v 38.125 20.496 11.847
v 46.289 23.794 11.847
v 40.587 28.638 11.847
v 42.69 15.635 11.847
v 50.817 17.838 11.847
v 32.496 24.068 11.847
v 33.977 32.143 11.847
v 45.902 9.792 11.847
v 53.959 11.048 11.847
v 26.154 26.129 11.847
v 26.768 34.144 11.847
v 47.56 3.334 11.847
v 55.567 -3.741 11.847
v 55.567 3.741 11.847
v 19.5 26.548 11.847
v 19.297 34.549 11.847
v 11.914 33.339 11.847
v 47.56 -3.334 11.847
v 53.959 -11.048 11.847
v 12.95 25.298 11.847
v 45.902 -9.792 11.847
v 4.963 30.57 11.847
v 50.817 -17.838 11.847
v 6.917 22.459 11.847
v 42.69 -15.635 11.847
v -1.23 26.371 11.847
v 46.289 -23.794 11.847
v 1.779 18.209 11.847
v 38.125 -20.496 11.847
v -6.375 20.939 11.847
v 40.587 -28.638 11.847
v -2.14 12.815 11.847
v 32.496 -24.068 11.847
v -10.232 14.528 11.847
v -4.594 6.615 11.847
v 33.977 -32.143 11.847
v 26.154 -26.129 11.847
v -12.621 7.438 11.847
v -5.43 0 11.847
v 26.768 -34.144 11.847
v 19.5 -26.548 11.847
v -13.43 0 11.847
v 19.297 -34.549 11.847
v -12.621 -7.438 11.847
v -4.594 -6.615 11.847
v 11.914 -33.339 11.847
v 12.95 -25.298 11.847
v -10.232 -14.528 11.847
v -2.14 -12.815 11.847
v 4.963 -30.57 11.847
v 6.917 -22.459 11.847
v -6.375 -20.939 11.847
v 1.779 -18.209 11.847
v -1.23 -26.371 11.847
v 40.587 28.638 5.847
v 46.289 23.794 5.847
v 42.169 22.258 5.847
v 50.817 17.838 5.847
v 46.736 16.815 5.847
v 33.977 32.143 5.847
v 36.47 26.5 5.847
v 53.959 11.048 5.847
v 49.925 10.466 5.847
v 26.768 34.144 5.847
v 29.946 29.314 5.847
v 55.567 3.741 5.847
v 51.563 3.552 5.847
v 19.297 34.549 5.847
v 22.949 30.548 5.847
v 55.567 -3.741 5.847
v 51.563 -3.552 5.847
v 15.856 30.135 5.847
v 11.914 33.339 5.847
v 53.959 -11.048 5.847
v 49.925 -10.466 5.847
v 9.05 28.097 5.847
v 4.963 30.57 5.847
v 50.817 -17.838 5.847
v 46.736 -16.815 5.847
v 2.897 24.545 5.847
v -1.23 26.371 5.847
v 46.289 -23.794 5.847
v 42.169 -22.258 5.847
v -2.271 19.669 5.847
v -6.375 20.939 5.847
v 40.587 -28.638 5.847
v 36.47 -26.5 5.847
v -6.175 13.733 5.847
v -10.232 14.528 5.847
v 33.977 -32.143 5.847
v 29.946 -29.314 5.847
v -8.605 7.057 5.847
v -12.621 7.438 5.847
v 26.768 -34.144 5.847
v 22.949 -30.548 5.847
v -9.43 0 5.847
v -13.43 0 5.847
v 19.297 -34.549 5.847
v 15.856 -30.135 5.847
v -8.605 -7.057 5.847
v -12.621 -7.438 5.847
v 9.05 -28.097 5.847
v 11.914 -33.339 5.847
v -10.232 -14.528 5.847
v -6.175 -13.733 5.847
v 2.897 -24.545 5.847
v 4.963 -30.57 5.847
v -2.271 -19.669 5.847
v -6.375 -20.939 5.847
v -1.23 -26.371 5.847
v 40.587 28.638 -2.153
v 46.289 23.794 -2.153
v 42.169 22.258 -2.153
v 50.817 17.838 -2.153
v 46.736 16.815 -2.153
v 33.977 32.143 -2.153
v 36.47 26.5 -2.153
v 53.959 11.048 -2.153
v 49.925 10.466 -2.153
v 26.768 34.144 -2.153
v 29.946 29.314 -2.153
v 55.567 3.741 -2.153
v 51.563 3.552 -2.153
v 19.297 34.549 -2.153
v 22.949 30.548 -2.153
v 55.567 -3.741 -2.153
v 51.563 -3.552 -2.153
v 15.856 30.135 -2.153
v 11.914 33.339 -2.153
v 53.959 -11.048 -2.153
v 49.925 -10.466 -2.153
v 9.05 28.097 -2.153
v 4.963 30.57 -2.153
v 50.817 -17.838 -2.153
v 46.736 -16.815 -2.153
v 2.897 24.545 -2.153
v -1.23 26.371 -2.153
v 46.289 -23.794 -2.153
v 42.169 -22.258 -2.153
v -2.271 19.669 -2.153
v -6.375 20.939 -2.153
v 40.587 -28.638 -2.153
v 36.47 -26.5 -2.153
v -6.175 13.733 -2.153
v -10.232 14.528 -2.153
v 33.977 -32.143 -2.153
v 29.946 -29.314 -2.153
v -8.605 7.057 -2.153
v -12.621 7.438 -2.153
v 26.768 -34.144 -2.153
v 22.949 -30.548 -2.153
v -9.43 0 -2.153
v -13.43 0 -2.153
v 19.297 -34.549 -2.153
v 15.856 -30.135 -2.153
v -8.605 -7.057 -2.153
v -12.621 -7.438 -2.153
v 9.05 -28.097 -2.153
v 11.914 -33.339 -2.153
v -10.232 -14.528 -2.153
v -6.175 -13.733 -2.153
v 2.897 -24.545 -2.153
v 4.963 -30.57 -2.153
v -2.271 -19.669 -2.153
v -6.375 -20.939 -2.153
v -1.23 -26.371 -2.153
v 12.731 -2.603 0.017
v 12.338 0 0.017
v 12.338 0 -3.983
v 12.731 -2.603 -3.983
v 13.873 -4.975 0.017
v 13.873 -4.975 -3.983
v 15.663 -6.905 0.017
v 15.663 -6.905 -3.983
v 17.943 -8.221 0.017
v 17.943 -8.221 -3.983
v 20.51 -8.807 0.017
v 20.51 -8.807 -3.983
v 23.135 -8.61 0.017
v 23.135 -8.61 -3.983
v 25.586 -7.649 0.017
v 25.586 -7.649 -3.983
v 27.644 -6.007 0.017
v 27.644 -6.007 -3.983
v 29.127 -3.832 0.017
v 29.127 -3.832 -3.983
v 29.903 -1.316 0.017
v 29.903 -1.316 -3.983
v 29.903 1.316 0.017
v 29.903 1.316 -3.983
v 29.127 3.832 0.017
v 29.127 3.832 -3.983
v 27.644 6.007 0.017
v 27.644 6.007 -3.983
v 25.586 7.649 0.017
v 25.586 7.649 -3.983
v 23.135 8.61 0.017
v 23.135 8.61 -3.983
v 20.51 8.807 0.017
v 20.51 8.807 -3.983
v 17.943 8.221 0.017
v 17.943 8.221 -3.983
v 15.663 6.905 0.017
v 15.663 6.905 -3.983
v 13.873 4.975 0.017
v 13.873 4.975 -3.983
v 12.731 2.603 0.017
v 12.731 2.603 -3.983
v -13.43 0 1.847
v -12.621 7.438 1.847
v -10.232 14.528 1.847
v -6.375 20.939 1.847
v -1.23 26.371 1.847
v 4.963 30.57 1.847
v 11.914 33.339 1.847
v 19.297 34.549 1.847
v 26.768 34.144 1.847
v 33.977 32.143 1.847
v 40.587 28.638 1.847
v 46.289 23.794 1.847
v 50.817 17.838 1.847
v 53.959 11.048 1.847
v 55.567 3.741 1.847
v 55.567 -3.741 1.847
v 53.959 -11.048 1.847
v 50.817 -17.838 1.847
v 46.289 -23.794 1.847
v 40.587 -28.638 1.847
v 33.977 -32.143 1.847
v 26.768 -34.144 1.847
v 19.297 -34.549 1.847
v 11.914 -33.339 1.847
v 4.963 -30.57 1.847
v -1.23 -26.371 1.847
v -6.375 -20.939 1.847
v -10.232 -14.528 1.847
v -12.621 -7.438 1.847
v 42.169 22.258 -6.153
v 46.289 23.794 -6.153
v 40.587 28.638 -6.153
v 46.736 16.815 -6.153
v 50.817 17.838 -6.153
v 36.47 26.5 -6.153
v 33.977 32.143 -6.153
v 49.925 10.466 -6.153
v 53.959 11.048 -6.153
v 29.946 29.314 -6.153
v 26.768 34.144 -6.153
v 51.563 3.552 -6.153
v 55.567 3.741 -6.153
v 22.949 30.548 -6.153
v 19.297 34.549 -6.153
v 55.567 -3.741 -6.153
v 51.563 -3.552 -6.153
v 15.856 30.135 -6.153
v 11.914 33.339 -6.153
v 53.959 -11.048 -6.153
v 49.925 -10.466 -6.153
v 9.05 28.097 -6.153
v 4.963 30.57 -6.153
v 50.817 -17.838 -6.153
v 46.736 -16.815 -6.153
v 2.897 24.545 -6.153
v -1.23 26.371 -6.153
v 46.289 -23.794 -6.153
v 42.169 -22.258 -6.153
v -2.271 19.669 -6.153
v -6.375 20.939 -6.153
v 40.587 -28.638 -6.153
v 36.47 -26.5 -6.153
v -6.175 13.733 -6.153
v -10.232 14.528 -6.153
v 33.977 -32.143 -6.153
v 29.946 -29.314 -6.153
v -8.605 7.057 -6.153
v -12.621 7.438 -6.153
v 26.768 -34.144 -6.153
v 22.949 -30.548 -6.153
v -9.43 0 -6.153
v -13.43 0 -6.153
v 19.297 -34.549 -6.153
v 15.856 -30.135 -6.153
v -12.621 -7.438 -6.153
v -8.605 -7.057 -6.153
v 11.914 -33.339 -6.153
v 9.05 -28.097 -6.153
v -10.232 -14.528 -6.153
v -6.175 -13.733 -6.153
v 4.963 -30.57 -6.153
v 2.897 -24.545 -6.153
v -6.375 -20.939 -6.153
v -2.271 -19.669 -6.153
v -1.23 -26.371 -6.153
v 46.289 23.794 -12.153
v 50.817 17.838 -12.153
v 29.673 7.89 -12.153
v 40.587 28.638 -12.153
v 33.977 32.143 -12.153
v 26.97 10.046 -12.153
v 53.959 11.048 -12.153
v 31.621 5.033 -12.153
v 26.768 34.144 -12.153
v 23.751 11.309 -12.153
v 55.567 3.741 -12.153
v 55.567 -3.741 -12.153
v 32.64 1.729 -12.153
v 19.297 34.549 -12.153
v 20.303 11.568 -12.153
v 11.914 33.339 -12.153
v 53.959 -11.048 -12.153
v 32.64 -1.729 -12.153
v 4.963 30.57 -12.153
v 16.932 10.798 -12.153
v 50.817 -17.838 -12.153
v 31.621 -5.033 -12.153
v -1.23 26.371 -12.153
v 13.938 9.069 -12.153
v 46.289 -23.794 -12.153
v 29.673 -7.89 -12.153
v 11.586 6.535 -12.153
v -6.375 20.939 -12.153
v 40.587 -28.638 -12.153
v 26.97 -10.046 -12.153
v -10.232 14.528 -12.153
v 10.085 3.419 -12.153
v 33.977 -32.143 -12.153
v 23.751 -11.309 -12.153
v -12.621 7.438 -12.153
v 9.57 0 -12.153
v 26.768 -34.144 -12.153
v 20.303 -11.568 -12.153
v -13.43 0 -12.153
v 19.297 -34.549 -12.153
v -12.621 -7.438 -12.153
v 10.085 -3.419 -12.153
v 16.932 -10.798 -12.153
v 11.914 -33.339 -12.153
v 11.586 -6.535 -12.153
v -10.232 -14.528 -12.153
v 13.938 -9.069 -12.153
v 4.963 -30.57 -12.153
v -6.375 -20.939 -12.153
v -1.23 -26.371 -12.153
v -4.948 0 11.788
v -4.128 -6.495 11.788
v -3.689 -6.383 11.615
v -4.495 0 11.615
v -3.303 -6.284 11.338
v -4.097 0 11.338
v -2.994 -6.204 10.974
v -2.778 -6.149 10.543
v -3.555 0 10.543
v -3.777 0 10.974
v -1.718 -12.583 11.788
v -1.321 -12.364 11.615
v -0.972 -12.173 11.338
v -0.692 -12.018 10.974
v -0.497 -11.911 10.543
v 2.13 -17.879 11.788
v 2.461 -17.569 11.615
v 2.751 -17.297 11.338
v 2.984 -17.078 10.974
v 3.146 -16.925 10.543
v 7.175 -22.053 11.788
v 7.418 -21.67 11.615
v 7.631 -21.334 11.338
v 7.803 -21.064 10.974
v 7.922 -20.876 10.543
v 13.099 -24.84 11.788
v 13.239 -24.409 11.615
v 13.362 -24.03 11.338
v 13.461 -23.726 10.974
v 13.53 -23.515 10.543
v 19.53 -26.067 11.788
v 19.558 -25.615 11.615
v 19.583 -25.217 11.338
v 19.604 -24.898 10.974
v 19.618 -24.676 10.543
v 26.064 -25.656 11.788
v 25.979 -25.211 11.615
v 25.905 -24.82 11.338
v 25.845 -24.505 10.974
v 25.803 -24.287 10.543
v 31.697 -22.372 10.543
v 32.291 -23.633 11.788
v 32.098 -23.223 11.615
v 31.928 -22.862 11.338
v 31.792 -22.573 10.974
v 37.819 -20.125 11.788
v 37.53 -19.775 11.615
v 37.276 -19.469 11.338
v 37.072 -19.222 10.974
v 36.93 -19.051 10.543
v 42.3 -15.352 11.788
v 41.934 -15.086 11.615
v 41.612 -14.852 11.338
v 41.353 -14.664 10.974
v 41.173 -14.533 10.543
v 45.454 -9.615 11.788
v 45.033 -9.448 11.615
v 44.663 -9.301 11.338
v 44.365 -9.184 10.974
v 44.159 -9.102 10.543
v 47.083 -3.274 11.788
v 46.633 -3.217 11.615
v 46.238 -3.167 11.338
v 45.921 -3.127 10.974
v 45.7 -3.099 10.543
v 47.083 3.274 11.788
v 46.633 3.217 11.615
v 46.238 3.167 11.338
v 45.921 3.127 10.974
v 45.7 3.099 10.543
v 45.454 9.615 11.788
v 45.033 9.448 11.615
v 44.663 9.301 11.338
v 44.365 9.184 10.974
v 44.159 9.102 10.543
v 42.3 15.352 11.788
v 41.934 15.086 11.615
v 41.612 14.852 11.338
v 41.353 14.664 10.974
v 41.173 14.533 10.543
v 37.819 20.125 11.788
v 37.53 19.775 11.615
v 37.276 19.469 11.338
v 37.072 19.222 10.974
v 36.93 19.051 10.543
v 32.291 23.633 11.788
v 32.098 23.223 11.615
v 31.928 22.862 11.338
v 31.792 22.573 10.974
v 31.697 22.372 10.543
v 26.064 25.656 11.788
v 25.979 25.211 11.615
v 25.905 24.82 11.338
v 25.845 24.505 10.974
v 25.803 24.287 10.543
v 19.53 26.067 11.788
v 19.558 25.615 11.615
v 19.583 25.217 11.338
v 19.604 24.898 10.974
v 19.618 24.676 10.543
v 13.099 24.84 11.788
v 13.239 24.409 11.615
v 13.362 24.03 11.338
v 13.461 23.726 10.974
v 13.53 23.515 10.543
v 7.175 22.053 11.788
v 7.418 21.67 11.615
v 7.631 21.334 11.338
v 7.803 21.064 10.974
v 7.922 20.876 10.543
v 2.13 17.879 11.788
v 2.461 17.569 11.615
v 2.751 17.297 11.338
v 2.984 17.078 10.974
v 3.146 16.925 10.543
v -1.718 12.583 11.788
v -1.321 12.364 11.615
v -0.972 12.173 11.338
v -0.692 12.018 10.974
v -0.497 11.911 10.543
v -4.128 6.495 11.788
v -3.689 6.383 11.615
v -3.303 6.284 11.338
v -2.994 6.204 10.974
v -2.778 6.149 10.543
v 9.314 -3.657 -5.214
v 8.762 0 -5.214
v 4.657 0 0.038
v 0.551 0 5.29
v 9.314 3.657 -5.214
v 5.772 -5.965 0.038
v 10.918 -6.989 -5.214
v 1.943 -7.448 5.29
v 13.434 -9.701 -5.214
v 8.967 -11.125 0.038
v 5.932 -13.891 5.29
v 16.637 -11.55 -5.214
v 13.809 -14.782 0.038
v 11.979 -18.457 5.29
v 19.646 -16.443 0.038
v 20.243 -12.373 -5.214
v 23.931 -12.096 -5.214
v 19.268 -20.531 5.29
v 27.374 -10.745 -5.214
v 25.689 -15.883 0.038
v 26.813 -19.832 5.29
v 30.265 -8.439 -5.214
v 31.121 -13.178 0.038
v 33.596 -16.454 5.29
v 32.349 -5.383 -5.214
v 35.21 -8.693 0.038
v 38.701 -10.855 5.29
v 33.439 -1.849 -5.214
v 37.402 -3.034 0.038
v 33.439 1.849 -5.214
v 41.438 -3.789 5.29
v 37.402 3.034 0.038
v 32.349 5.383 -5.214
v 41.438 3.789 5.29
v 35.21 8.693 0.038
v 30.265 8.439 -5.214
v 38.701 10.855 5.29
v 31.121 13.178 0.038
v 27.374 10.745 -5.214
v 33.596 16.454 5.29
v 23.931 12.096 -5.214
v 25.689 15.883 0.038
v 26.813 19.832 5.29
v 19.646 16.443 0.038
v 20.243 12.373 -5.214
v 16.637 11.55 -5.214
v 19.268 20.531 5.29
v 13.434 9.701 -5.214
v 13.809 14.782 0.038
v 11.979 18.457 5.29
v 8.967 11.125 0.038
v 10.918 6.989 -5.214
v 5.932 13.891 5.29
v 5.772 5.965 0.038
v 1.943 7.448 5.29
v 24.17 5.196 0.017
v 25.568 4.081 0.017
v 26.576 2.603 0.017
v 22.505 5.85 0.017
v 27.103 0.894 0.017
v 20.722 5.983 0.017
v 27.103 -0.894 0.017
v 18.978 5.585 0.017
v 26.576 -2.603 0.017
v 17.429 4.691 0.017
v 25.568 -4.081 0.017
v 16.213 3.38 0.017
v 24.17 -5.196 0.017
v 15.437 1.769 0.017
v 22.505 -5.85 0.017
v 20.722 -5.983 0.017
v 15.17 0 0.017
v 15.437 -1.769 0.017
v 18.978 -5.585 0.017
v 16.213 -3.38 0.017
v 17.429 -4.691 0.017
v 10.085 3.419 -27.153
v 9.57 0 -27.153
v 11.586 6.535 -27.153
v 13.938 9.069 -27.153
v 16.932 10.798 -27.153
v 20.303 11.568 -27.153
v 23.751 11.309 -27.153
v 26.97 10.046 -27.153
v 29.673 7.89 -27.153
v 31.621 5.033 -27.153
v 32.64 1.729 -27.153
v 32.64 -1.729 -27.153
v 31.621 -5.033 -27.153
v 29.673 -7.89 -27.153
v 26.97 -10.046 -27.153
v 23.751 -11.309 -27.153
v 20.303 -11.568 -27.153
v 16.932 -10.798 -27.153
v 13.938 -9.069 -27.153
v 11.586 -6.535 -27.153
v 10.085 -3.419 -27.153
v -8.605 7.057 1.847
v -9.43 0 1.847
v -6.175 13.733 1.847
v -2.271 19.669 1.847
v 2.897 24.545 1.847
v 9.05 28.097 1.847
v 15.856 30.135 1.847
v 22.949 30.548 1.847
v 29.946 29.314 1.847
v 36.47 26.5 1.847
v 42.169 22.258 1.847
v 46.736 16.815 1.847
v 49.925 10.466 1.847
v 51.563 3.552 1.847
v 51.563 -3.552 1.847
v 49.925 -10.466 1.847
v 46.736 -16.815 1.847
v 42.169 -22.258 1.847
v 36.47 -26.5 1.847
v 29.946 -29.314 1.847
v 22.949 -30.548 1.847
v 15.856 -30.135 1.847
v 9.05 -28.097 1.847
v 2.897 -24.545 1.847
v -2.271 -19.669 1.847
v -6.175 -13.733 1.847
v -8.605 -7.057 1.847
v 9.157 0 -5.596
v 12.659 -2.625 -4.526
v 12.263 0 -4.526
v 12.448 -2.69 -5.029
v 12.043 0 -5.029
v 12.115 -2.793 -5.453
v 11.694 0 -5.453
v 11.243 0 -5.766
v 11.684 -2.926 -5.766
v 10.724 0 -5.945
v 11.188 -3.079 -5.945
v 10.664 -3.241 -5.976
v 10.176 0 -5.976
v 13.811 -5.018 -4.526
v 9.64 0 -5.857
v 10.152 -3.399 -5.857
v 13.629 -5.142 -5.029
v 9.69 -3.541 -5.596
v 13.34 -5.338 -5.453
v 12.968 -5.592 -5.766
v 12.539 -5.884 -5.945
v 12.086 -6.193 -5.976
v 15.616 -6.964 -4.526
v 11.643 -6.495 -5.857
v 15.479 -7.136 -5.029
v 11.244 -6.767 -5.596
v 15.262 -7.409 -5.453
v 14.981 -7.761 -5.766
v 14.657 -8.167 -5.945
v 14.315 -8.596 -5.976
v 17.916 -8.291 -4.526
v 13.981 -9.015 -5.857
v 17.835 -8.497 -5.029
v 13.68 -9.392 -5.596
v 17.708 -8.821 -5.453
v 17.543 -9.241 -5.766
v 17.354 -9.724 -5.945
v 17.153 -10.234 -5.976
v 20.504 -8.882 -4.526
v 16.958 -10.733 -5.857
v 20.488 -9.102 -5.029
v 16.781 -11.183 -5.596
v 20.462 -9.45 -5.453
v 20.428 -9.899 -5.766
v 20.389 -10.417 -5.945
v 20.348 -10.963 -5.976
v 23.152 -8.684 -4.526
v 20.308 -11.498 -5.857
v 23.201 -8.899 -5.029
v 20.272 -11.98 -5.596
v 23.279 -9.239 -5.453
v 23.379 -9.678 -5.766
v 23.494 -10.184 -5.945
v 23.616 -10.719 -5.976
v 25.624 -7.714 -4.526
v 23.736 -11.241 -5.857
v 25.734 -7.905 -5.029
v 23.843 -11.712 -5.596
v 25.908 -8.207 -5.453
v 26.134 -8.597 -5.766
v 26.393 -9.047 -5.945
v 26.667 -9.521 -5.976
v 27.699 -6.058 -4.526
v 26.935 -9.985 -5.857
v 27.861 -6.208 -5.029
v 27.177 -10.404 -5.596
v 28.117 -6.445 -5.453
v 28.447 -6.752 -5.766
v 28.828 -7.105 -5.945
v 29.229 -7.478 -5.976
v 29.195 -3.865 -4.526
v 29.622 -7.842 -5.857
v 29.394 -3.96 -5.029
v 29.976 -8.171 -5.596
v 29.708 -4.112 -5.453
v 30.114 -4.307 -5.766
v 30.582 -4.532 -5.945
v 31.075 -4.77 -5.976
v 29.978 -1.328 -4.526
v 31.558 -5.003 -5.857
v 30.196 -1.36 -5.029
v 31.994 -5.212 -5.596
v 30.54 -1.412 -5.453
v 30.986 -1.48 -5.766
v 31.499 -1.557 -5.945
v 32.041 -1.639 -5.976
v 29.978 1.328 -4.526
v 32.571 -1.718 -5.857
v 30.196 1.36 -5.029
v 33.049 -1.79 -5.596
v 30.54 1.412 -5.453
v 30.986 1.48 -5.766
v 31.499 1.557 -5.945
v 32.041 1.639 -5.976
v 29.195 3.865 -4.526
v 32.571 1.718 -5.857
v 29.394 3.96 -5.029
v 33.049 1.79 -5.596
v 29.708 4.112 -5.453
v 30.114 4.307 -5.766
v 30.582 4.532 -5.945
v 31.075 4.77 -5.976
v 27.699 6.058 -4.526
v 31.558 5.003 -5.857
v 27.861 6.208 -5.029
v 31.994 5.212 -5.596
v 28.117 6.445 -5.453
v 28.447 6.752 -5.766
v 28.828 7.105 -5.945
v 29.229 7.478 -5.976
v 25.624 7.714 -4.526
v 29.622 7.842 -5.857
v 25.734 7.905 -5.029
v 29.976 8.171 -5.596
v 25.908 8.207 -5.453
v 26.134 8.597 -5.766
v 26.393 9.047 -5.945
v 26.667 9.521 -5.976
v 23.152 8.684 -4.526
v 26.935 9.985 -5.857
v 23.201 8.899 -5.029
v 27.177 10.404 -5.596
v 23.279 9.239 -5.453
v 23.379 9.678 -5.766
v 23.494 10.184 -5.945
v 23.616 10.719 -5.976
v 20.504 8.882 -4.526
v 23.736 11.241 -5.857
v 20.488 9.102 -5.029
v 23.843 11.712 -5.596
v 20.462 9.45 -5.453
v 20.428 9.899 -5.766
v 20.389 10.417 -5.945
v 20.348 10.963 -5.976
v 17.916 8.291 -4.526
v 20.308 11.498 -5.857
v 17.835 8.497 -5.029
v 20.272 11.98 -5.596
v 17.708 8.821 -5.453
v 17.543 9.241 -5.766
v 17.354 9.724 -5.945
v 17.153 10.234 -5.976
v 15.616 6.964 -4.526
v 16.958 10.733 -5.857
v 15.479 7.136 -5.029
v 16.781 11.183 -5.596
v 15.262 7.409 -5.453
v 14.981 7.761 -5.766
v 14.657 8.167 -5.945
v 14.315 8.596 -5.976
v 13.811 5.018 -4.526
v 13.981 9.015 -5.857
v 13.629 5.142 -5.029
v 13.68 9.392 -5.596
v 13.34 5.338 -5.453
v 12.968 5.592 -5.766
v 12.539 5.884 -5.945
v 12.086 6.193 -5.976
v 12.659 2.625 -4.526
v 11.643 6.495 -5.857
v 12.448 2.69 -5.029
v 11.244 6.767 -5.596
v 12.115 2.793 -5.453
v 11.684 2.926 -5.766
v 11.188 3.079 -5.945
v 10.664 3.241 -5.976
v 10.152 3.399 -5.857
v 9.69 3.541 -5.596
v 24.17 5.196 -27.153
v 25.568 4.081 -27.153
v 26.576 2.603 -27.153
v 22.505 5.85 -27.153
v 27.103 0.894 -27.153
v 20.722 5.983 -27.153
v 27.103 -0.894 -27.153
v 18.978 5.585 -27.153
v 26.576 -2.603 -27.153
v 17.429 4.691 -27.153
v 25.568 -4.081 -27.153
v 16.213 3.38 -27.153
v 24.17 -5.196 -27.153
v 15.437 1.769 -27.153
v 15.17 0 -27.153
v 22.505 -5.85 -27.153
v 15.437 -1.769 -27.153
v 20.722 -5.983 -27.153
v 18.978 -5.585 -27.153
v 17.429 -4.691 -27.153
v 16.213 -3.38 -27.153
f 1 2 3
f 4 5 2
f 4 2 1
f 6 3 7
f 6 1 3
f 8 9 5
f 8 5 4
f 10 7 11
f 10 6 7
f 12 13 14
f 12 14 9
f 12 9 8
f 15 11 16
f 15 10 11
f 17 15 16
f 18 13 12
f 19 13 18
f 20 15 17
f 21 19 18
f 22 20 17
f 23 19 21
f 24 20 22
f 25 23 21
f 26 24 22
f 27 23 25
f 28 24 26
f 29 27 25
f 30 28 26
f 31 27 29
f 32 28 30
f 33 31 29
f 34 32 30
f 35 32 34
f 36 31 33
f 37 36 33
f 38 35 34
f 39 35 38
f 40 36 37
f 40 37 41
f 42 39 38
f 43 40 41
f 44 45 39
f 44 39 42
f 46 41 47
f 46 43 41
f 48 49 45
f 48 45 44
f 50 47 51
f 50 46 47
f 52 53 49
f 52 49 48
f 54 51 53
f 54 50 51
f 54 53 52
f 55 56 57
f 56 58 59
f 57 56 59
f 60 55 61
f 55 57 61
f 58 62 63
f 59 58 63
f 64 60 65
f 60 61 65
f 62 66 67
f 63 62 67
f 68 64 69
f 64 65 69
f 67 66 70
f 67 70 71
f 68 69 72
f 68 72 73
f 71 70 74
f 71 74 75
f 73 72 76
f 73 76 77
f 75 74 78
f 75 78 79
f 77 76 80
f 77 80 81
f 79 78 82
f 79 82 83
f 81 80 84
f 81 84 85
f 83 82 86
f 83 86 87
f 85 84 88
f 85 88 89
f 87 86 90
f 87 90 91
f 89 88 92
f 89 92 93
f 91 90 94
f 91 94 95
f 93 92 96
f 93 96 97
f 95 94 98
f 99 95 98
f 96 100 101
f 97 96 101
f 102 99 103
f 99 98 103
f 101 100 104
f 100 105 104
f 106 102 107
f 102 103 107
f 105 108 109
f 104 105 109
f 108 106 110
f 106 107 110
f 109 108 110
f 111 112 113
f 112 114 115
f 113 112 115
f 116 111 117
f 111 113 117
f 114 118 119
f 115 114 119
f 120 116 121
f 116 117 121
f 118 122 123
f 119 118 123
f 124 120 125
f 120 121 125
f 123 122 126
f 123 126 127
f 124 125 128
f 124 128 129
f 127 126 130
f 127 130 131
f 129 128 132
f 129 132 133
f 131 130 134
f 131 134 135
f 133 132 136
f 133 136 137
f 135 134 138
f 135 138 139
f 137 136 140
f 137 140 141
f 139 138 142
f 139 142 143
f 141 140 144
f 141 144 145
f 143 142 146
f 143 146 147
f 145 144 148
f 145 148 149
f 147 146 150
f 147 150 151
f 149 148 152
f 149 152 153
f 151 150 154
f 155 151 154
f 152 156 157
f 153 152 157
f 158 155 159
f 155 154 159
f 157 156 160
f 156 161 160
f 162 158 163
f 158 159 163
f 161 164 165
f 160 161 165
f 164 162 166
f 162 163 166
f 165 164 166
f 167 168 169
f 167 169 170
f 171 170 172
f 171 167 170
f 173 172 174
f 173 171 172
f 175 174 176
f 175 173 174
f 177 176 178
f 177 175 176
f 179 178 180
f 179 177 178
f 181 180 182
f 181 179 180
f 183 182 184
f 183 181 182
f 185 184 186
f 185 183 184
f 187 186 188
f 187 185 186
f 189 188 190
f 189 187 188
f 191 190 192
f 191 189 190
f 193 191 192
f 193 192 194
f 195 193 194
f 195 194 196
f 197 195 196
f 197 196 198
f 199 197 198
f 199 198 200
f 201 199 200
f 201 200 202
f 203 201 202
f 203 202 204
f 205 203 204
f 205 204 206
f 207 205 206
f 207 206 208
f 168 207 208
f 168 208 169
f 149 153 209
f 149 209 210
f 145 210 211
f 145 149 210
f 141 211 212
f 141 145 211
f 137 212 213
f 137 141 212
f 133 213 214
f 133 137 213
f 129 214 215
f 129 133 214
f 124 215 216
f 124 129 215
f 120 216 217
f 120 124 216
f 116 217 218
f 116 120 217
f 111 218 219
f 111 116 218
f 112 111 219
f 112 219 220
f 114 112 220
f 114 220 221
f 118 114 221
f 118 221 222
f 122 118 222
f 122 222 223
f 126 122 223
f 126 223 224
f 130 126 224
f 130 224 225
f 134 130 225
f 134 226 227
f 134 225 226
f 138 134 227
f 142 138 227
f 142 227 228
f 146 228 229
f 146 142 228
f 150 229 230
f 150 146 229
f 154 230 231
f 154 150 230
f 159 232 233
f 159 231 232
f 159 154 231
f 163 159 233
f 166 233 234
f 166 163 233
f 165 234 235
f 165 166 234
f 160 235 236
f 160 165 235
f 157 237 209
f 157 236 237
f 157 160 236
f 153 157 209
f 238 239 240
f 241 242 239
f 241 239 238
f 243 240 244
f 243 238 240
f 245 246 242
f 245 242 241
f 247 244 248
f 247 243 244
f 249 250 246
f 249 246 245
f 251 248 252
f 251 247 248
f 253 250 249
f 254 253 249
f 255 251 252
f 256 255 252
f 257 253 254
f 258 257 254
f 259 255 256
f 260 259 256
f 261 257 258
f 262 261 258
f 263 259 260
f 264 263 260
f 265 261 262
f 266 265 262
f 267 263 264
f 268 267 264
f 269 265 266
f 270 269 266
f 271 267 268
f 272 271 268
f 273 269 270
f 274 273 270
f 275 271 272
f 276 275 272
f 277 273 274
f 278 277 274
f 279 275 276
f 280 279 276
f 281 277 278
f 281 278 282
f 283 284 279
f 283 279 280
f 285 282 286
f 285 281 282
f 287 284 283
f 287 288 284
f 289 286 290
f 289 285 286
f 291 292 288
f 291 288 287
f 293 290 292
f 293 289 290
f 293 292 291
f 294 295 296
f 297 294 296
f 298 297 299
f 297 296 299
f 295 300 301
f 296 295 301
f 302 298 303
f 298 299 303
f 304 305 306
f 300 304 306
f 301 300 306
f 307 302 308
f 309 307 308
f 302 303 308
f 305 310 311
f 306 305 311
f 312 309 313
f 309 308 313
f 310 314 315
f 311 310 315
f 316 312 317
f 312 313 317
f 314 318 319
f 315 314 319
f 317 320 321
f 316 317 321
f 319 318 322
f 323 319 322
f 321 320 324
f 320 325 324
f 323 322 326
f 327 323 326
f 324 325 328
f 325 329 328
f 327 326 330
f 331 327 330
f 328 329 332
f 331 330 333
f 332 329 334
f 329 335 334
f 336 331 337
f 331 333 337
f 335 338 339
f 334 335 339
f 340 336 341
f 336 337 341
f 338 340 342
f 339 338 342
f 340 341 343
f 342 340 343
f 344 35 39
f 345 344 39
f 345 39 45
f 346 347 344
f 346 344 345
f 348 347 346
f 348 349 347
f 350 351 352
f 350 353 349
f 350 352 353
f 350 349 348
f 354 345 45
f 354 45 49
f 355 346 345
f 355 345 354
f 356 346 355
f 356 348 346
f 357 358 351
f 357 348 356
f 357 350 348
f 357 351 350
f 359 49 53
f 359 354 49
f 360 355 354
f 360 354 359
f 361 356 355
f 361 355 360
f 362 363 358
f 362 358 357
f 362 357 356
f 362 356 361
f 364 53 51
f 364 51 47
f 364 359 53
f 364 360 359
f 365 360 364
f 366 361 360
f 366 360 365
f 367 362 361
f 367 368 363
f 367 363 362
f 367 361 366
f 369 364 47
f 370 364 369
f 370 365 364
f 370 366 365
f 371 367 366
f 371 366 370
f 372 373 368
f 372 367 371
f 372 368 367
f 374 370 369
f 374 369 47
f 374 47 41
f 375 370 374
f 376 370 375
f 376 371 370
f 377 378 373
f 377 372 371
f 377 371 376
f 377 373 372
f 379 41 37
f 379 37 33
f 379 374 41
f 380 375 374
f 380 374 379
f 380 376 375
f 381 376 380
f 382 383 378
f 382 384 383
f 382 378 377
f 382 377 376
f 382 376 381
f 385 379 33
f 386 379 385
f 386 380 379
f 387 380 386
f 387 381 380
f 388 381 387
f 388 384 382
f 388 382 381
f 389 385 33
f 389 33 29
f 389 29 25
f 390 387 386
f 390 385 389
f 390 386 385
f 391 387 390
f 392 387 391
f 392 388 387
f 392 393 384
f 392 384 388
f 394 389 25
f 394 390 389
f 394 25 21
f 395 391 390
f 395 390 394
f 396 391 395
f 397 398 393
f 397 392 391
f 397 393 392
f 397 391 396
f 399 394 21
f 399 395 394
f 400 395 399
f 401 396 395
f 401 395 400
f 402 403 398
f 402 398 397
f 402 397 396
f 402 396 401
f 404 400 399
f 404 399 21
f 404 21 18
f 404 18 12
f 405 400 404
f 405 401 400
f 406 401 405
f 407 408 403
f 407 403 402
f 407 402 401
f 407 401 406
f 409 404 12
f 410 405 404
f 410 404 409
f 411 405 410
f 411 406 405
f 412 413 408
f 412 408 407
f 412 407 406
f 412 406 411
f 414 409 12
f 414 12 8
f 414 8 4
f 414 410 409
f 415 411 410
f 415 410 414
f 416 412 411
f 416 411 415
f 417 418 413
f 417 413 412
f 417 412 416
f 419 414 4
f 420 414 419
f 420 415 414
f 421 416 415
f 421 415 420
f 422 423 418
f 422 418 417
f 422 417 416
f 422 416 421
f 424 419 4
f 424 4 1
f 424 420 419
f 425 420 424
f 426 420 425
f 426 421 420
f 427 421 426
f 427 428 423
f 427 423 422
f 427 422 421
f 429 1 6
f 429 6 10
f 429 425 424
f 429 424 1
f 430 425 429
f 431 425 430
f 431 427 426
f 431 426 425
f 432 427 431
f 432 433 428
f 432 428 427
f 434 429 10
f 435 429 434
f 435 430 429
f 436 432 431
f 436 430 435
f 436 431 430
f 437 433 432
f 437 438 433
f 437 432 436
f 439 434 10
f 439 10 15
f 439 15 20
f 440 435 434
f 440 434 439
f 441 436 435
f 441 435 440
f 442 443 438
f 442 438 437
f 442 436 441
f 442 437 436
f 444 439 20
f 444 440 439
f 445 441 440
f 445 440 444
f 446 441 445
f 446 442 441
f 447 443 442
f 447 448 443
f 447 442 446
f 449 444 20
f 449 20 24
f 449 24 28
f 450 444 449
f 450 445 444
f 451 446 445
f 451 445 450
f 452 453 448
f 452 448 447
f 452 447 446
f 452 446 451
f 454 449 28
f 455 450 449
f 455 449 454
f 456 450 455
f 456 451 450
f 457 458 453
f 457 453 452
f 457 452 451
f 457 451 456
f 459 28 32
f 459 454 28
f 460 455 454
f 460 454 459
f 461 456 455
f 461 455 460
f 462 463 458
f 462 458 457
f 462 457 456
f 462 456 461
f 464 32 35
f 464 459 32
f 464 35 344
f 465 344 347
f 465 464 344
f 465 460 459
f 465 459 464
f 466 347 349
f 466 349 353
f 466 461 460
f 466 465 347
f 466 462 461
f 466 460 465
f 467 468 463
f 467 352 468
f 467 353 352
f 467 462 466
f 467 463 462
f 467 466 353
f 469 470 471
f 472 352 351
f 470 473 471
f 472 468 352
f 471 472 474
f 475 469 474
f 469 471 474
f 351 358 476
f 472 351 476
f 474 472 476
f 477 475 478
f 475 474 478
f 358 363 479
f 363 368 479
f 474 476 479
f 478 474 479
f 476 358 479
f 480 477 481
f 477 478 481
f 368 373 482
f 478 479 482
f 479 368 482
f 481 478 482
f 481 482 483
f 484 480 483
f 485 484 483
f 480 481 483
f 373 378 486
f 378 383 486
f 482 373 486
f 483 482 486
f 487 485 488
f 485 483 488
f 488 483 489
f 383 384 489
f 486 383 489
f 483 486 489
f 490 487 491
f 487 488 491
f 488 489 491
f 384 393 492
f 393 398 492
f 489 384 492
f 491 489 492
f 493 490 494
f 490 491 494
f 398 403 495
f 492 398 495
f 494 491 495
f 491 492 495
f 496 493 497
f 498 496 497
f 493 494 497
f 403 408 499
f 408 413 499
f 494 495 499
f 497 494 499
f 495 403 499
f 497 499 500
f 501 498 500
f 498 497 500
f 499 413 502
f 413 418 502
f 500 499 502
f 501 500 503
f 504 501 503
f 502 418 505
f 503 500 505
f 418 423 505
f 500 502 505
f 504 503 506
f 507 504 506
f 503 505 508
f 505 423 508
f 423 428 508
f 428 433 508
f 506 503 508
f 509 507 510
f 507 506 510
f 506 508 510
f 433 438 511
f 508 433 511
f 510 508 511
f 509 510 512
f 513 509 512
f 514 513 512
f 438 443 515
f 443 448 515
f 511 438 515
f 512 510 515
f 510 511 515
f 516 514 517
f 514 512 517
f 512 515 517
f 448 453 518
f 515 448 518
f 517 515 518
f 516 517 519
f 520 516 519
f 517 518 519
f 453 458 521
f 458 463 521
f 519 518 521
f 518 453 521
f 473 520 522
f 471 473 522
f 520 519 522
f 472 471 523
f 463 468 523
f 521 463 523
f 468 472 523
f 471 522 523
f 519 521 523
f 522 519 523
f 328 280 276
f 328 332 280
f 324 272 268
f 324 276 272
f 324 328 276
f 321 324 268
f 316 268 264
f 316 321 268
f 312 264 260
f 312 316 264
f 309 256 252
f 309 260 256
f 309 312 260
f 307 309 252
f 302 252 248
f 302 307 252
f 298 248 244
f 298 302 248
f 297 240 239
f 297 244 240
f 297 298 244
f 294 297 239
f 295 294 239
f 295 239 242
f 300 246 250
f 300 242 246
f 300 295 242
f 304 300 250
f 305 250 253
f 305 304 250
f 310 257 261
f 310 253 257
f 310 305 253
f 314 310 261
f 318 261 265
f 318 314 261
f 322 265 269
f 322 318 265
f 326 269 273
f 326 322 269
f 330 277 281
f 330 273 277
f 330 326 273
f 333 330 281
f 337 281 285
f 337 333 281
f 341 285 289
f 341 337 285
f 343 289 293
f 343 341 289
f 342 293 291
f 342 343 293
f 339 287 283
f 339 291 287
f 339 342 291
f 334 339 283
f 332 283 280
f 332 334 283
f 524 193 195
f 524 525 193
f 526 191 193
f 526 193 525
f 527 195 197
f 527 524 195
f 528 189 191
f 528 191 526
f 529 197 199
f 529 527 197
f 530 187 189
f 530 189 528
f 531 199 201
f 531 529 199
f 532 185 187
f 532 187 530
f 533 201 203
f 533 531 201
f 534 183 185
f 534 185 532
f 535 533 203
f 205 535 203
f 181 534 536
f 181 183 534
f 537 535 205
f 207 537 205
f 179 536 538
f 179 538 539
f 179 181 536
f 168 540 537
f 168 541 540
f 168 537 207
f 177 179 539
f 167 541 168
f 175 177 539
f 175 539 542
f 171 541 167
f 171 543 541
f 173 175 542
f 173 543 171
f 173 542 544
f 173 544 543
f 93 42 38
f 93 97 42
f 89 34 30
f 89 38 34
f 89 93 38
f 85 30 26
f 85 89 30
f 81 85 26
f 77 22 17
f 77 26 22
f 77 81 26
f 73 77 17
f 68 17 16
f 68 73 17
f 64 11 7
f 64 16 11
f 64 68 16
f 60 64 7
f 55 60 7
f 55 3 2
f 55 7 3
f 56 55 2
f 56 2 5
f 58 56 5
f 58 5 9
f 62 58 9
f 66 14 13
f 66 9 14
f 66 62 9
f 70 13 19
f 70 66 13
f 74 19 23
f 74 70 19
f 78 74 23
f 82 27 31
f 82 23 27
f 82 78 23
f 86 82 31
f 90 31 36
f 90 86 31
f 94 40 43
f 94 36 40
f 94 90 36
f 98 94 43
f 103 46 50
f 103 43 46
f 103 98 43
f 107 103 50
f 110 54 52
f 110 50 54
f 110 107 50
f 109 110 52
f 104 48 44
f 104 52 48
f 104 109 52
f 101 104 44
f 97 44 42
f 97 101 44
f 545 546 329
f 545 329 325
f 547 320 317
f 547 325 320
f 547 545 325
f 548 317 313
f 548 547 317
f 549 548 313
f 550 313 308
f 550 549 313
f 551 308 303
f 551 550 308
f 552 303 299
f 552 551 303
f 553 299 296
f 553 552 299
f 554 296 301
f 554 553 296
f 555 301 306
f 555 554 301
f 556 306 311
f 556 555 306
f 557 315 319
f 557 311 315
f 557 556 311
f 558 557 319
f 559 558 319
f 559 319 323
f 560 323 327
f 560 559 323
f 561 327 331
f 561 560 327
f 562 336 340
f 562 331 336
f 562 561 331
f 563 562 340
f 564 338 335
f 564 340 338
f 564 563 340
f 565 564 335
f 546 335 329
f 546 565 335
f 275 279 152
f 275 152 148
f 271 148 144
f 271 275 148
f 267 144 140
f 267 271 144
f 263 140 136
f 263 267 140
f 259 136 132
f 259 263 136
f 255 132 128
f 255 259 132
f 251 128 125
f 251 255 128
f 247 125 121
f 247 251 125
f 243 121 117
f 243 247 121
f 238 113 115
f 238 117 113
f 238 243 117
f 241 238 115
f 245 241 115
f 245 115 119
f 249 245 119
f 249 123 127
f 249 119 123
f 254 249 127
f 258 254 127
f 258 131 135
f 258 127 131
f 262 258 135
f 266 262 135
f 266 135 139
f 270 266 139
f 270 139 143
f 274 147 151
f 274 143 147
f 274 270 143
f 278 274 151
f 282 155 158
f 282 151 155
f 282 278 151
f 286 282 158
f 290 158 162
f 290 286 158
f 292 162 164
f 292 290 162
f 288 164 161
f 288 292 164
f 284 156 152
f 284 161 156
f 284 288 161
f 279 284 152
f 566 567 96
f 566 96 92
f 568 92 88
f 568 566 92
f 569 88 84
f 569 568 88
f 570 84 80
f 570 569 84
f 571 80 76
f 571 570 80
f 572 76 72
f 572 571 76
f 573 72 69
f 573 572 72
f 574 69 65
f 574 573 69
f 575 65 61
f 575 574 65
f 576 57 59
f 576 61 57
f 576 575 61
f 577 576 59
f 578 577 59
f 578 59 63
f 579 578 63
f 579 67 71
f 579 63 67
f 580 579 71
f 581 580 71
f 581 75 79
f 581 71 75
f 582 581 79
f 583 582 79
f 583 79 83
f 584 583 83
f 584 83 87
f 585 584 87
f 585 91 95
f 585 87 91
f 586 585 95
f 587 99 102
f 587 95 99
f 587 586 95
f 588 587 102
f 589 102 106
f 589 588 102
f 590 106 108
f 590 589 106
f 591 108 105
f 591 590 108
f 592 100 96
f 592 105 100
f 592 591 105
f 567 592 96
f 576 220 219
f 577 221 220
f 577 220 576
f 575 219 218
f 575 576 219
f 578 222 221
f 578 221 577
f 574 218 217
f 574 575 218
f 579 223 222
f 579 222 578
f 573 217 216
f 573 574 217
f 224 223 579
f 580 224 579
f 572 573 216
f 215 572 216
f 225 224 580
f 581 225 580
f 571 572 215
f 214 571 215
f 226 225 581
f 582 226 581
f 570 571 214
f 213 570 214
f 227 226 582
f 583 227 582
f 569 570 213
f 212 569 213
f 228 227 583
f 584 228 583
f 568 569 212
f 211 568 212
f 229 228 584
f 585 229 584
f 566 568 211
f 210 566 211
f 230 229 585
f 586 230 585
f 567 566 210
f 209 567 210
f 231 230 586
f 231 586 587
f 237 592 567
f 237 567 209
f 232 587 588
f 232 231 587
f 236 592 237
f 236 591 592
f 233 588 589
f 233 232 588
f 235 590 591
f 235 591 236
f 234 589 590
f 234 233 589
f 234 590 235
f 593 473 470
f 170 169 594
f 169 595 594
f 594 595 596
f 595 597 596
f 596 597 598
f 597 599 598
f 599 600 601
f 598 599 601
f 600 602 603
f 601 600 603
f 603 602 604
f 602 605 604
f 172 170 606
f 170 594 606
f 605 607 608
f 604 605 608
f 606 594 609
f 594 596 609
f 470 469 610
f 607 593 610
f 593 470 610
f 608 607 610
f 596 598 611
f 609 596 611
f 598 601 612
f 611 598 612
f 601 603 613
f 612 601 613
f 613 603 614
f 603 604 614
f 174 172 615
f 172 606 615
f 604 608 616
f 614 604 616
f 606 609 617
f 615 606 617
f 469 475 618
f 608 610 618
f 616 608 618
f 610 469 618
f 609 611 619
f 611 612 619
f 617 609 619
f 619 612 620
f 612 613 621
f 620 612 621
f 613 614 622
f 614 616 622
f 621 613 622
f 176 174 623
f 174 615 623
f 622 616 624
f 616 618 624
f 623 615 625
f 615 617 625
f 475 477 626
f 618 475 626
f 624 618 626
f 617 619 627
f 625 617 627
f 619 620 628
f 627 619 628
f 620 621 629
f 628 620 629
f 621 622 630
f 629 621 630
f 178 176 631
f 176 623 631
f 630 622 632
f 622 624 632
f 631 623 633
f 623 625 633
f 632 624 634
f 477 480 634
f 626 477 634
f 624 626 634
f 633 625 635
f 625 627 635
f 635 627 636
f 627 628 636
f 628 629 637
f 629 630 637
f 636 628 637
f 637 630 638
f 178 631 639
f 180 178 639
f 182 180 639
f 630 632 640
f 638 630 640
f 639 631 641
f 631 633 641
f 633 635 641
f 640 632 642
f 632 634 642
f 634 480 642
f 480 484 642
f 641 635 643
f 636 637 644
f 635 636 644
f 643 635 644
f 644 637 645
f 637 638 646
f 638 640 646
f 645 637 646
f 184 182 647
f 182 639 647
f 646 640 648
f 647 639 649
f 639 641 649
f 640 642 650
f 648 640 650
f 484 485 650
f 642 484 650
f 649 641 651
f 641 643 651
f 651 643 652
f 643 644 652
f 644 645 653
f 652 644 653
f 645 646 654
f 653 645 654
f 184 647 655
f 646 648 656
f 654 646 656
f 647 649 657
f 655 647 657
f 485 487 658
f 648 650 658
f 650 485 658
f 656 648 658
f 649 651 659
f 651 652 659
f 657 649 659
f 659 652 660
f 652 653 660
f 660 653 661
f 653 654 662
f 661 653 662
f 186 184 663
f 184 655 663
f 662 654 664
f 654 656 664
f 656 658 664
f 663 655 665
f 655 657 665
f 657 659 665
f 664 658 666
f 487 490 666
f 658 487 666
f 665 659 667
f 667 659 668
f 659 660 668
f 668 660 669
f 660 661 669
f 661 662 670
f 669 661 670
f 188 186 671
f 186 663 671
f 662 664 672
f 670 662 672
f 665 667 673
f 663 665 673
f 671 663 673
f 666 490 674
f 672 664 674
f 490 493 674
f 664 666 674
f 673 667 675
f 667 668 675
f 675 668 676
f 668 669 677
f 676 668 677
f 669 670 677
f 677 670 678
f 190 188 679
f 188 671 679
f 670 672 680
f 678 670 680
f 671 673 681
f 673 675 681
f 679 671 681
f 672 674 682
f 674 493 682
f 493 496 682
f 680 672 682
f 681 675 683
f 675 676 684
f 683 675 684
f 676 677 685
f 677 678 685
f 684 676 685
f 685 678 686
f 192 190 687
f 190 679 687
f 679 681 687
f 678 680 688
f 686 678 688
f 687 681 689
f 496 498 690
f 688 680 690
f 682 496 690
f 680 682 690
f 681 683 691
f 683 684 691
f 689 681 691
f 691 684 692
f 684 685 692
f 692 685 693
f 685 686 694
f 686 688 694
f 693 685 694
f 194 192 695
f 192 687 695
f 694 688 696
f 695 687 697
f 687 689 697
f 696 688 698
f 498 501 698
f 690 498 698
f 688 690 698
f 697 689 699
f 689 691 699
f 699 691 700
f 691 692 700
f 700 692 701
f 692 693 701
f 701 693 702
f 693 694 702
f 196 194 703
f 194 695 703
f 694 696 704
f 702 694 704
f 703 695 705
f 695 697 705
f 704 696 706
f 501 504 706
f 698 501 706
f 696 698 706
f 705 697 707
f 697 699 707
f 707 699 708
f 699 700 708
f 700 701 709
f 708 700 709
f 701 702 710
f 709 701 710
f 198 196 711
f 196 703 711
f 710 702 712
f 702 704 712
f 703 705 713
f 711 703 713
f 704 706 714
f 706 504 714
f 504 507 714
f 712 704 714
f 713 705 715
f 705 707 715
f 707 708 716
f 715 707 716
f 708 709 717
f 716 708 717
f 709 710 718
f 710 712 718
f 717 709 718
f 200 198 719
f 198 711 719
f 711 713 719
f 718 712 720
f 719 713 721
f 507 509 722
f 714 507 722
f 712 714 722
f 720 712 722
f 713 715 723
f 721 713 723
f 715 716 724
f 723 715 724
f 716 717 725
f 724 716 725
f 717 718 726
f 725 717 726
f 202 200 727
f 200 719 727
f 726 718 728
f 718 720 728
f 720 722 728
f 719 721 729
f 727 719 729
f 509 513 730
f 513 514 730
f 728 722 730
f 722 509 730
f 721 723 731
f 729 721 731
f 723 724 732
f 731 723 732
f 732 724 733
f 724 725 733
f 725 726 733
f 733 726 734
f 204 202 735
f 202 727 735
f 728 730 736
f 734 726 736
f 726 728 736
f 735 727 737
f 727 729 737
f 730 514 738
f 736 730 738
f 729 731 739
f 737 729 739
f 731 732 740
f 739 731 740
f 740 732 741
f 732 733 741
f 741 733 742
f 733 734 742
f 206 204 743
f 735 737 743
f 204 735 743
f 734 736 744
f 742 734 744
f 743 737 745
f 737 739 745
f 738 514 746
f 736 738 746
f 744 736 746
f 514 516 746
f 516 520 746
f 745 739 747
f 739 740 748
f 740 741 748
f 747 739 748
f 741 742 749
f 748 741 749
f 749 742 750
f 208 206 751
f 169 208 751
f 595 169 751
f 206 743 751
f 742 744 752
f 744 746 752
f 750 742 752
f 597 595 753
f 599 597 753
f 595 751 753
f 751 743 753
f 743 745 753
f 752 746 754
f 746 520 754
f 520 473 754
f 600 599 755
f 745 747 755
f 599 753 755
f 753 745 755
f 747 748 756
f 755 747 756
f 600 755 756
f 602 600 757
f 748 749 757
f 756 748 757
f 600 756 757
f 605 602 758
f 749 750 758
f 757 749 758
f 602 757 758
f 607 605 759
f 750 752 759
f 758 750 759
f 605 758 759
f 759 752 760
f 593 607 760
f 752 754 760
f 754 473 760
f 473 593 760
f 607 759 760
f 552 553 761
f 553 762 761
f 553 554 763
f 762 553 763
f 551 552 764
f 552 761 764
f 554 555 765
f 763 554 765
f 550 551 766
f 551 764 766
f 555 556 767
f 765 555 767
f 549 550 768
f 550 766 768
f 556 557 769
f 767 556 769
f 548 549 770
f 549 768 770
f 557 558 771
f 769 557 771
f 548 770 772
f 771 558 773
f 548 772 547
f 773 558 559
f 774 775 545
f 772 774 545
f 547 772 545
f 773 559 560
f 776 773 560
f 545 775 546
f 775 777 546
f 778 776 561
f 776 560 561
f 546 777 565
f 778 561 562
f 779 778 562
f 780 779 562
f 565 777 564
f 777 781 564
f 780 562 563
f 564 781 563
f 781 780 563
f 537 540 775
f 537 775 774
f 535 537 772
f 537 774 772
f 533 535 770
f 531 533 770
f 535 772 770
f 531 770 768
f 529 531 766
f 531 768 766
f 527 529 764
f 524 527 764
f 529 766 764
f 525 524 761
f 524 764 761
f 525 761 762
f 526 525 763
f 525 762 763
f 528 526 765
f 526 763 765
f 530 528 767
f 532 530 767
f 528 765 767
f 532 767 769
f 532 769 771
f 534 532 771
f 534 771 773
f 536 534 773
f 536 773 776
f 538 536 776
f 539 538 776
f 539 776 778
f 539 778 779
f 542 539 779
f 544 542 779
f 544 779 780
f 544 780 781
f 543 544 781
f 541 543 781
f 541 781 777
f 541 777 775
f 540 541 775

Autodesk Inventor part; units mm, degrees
ref_plane "YZ Plane" through (0, 0, 0) normal (1, 0, 0) x (0, 1, 0)
ref_plane "XZ Plane" through (0, 0, 0) normal (0, 1, 0) x (-1, 0, 0)
ref_plane "XY Plane" through (0, 0, 0) normal (0, 0, 1) x (1, 0, 0)
sketch "Szkic1" plane through (0, 0, 0) normal (0, 1, 0) x (-1, 0, 0)
  line L0 (5.43, 11.8473) -> (13.43, 11.8473)
  line L1 (13.43, -12.1527) -> (-9.57, -12.1527)
  line L2 (-9.57, -12.1527) -> (-9.57, -27.1527)
  line L3 (-9.57, -27.1527) -> (-21.17, -27.1527)
  arc A0 (5.43, 11.8473) -> (3.5548, 10.5426) centre (5.43, 9.8473) ccw
  line L4 (3.5548, 10.5426) -> (-8.7625, -5.2144)
  arc A1 (-12.3382, -3.9827) -> (-8.7625, -5.2144) centre (-10.3382, -3.9827) ccw
  line L5 (-12.3382, -3.9827) -> (-12.3382, 0.0173)
  line L6 (-21.17, -27.1527) -> (-21.17, 0.0173)
  line L7 (-21.17, 0.0173) -> (-12.3382, 0.0173)
  line L8 (13.43, 11.8473) -> (13.43, 5.8473)
  line L9 (13.43, 5.8473) -> (9.43, 5.8473)
  line L10 (9.43, 5.8473) -> (9.43, 1.8473)
  line L11 (9.43, 1.8473) -> (13.43, 1.8473)
  line L12 (13.43, 1.8473) -> (13.43, -1.1527)
  line L13 (13.43, 1.8473) -> (13.43, -2.1527)
  line L14 (13.43, -2.1527) -> (9.43, -2.1527)
  line L15 (9.43, -2.1527) -> (9.43, -6.1527)
  line L16 (9.43, -6.1527) -> (13.43, -6.1527)
  line L17 (13.43, -6.1527) -> (13.43, -12.1527)
  point P0 (0, 0)
  dimension "d0" = 8
  dimension "d1" = 24
  dimension "d2" = 23
  dimension "d3" = 15
  dimension "d4" = 11.6
  dimension "d5" = 2
  dimension "d6" = 20
  dimension "d7" = 2
  dimension "d8" = 4
  dimension "d16" = 6
  dimension "d17" = 4
  dimension "d18" = 4
  dimension "d19" = 4
  dimension "d21" = 4
  dimension "d22" = 4
  dimension "d23" = 4
  dimension "d24" = 4
revolve "Obrót1" add sketch "Szkic1" angle 360 about axis through (21.17, 0, -27.1527) along (0, 0, 1)
sketch "Szkic2" plane through (21.17, 0, -27.1527) normal (0, 0, -1) x (-1, 0, 0)
  point P0 (21.17, 0)
sketch "Szkic3" plane through (21.17, 0, -27.1527) normal (0, 0, -1) x (-1, 0, 0)
  circle A0 centre (0, 0) radius 6
  point P0 (21.17, 0)
  dimension "d13" = 12
extrude "Wyciągnięcie proste2" cut sketch "Szkic3" against normal blind 39
properties part number "7Tłok" material "Tworzywo sztuczne PET"
